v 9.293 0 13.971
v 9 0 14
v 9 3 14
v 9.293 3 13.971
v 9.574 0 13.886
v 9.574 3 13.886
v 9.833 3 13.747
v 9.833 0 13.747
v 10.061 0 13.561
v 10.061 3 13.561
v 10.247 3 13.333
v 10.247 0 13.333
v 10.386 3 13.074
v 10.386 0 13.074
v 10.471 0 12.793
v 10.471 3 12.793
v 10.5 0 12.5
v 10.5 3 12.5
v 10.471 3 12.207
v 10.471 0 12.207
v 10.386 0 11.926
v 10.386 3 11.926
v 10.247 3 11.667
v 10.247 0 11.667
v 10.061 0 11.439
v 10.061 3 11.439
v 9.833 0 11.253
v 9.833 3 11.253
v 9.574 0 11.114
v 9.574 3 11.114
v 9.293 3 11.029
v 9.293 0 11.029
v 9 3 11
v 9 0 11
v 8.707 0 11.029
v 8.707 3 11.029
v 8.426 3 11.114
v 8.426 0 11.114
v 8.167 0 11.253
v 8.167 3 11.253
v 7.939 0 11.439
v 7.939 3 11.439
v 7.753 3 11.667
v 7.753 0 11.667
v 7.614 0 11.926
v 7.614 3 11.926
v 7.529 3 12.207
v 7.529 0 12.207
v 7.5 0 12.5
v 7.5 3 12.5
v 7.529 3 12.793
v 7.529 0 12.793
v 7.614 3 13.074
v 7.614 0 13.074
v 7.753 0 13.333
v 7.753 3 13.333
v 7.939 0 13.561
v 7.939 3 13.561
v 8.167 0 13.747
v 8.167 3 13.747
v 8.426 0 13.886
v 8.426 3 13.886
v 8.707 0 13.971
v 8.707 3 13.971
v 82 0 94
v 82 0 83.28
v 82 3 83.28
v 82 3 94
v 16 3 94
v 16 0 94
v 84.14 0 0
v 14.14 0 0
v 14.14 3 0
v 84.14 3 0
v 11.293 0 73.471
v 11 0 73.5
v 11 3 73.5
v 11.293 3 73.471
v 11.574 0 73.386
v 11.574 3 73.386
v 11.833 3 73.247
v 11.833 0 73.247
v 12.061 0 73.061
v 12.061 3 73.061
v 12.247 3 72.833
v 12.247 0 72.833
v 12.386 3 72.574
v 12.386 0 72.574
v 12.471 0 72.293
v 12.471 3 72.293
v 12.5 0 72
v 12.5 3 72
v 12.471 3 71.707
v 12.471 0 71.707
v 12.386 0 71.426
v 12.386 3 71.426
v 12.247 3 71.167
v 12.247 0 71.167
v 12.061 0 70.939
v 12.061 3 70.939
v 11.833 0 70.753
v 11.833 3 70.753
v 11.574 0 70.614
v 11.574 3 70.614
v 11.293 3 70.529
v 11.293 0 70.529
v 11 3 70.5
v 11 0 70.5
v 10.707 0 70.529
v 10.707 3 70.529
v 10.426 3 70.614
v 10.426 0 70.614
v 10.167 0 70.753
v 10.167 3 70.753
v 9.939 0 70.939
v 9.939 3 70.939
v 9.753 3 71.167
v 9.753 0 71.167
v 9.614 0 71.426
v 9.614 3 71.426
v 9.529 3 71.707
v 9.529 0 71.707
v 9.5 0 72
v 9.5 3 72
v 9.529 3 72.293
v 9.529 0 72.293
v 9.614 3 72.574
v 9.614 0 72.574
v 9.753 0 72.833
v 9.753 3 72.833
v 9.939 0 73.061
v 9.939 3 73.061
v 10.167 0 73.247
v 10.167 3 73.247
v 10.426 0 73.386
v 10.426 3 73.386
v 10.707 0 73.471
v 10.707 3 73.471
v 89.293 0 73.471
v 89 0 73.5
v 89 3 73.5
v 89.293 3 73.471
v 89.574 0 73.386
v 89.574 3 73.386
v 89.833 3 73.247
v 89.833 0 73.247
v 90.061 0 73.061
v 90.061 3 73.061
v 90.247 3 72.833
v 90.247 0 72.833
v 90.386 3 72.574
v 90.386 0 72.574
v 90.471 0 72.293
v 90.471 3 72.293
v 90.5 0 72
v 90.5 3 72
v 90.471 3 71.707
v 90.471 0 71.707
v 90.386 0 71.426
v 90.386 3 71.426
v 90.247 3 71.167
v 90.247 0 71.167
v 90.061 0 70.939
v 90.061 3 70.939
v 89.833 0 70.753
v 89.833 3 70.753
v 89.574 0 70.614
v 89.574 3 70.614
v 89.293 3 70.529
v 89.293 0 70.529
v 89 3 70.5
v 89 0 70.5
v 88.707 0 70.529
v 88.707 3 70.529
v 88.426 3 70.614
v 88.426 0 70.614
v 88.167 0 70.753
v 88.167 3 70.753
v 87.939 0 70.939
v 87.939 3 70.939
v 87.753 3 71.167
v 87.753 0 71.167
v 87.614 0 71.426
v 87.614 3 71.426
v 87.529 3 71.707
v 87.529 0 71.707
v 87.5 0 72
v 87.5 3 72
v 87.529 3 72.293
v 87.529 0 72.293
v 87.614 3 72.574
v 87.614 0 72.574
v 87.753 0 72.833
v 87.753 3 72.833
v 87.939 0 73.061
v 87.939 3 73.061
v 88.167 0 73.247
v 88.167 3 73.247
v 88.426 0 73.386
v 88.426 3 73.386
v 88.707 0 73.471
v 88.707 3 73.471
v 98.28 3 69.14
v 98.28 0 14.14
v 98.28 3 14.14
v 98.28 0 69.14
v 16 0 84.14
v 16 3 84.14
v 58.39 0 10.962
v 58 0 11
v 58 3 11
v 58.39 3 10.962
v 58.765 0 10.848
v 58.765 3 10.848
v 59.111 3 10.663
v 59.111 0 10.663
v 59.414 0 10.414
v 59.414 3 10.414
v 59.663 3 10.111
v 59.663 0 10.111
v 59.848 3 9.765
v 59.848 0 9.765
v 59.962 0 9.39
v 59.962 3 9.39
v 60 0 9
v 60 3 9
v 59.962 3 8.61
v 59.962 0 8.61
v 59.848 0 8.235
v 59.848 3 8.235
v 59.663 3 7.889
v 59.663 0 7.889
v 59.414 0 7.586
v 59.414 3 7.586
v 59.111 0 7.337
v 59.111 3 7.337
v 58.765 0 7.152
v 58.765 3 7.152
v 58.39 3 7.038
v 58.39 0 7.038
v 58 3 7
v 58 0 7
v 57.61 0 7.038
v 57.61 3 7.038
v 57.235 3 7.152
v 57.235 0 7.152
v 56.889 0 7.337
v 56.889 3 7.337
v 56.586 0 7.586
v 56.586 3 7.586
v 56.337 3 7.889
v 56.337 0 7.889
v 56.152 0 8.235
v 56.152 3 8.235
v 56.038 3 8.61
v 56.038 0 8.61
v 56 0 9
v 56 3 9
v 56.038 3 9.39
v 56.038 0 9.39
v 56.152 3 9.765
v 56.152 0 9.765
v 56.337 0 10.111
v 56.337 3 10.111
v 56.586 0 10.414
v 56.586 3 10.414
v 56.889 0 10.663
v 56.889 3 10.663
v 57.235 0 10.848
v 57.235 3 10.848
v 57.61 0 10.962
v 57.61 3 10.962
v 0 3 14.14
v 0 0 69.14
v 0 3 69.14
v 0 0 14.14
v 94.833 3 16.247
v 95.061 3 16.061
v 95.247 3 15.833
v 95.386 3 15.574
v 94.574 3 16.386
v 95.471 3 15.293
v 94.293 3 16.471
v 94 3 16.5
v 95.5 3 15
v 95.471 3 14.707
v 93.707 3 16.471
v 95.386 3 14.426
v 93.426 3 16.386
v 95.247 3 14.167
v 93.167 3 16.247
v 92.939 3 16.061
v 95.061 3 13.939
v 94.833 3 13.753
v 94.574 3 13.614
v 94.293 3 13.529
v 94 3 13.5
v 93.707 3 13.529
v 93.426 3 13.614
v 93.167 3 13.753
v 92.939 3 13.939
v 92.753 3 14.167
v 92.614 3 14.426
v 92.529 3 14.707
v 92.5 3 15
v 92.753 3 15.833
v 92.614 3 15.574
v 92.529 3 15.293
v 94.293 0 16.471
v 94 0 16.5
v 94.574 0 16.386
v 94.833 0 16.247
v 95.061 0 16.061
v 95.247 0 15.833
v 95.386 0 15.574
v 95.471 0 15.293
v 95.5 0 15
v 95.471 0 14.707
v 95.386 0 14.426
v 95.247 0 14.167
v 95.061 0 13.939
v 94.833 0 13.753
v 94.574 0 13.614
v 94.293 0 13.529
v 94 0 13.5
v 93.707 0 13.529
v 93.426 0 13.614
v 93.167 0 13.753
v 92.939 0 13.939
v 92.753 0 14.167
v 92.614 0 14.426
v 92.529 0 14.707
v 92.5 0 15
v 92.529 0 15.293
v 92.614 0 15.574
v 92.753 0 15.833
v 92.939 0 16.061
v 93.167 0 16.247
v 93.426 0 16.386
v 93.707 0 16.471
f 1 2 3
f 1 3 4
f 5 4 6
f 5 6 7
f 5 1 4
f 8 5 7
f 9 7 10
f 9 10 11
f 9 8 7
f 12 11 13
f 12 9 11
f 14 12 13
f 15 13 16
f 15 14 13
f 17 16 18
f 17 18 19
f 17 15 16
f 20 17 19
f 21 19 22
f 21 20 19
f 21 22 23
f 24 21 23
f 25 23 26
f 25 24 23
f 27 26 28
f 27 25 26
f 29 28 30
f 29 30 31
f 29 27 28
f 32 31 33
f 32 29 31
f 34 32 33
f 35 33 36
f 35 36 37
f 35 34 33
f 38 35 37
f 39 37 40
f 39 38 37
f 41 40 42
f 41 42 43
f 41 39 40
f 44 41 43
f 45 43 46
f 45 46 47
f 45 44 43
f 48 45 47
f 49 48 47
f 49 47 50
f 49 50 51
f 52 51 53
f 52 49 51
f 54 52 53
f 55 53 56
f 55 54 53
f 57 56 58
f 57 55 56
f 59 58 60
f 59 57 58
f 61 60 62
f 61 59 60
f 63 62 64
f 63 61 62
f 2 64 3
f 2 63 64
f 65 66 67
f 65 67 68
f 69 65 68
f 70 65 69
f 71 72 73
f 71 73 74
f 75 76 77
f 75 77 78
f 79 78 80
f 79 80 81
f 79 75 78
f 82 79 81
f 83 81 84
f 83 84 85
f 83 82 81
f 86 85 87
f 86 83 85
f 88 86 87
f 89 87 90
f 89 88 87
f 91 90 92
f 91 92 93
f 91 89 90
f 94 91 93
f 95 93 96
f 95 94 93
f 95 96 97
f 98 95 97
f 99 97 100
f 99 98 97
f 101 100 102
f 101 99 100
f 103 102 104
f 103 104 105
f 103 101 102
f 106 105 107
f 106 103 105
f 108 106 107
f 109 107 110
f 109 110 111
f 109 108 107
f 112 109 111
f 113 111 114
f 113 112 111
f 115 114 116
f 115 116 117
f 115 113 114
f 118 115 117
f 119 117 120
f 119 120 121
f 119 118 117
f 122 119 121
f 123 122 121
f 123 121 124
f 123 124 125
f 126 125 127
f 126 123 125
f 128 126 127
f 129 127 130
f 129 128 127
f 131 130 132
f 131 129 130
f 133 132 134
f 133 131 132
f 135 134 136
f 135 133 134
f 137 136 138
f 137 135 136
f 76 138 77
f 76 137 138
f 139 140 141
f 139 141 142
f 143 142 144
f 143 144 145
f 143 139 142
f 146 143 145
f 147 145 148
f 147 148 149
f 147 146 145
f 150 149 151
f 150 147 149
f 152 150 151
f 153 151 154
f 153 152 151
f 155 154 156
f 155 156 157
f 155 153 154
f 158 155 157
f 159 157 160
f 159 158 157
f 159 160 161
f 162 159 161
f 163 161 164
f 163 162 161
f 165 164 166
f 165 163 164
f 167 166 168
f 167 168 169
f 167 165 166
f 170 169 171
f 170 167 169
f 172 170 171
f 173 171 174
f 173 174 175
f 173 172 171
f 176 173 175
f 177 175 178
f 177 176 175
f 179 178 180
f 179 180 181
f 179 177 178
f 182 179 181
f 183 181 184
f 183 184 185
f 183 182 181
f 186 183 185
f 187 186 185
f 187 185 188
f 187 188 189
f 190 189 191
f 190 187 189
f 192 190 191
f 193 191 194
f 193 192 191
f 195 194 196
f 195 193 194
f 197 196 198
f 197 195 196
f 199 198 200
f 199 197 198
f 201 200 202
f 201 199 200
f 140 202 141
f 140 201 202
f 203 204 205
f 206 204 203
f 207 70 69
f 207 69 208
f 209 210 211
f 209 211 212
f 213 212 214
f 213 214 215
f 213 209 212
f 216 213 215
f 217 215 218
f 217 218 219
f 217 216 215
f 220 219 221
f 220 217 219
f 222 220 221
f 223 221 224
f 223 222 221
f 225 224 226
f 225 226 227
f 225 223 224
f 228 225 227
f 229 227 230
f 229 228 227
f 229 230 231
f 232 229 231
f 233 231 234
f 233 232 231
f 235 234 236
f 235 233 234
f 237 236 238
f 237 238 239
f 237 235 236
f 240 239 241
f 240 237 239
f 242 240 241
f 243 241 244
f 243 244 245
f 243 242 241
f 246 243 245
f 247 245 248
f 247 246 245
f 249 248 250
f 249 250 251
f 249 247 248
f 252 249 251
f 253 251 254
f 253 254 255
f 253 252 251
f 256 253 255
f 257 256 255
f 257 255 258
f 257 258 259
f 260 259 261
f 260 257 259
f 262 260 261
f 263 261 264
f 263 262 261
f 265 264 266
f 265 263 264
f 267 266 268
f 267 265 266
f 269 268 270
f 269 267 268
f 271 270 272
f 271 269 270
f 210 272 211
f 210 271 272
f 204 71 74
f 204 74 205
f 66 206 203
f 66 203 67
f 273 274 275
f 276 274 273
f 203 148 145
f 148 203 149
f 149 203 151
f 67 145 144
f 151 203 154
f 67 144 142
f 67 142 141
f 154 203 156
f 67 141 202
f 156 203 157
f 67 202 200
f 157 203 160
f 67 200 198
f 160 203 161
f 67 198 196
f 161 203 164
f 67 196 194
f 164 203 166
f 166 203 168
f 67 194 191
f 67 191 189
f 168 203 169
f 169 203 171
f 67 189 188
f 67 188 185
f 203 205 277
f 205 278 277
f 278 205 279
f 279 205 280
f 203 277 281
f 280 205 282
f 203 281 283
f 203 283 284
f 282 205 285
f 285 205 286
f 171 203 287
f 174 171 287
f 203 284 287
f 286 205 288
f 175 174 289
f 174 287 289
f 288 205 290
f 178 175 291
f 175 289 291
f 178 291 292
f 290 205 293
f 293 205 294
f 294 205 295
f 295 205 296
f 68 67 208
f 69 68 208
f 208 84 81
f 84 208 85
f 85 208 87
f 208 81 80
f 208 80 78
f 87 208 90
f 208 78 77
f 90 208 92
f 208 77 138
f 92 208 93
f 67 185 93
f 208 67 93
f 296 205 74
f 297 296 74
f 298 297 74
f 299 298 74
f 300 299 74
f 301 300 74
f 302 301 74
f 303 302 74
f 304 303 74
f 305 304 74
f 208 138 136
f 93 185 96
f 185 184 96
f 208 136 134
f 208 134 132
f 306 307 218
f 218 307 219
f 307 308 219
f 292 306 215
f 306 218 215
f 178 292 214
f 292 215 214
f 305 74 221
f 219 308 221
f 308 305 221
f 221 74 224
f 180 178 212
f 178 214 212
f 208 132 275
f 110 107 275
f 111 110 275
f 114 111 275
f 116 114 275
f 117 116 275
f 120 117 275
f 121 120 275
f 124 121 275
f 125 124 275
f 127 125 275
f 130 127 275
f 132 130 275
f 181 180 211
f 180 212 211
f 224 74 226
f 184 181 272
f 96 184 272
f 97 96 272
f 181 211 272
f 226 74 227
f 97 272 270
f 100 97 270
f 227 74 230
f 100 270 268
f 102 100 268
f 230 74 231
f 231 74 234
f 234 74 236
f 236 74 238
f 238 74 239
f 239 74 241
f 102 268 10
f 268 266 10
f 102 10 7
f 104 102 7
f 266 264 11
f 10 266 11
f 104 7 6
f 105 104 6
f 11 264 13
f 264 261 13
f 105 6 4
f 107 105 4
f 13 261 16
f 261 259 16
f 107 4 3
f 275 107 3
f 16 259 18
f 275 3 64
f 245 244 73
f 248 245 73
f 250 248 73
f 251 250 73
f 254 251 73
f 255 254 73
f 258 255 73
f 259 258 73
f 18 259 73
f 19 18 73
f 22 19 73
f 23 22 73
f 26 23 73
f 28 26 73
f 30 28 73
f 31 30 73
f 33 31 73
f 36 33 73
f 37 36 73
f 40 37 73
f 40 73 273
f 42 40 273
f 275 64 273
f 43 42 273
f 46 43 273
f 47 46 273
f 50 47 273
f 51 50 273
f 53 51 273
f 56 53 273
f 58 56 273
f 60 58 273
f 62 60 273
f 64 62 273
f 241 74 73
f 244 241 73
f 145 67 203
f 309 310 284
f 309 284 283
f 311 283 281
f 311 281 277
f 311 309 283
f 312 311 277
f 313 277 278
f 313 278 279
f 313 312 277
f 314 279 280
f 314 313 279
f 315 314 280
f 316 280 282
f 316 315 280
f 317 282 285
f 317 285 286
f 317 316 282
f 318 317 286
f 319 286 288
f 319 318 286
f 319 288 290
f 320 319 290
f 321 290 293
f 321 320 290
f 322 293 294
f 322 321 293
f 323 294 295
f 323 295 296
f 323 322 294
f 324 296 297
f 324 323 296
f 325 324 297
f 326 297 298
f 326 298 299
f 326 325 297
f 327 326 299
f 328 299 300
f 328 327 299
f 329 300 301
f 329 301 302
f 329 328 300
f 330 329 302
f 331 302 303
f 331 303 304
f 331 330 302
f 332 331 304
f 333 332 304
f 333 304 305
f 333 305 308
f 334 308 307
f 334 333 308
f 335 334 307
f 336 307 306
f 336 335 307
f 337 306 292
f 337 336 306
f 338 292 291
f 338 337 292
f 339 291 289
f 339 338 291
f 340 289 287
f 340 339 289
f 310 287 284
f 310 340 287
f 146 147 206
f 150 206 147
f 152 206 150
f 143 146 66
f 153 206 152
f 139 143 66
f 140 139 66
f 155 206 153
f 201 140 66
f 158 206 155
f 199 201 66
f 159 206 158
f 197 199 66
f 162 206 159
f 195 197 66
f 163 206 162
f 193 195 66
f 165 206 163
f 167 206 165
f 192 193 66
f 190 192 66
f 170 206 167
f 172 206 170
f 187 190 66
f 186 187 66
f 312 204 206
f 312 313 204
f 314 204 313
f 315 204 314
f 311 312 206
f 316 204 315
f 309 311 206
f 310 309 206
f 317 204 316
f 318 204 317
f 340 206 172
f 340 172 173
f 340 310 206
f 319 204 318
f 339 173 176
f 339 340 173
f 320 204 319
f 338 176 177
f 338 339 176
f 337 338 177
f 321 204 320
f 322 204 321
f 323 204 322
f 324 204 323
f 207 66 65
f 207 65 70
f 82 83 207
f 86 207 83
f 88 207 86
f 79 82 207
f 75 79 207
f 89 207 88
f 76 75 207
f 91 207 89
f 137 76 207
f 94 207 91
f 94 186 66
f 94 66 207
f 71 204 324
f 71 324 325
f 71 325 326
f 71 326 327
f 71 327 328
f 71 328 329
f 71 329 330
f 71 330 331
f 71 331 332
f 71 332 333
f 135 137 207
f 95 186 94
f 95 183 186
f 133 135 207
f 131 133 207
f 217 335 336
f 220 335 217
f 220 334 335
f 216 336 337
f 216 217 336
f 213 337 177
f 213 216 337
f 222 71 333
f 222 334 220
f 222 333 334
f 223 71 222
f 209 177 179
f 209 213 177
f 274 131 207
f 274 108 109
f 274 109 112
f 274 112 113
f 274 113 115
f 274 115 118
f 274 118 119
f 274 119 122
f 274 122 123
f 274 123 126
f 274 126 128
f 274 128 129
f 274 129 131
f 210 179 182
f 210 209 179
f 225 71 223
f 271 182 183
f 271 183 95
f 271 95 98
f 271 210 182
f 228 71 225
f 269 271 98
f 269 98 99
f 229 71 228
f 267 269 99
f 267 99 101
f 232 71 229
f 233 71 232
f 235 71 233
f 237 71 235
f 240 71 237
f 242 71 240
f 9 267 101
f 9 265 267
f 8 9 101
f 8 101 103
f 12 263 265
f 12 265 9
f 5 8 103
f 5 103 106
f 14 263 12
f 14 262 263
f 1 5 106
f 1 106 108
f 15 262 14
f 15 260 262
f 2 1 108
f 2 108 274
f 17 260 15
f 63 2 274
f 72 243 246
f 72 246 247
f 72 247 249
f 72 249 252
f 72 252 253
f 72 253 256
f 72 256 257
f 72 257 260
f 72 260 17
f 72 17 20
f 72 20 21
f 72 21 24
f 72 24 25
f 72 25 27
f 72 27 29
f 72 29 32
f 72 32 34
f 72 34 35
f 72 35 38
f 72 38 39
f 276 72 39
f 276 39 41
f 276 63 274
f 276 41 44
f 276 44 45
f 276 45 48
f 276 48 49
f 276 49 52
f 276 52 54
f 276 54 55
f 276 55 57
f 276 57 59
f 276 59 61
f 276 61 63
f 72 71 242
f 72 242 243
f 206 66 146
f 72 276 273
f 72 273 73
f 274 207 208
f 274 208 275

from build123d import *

# Parameters (mm, degrees)
SKETCH_1_R      = 1.5
SKETCH_1_R_2    = 2
EXTRUDE_1_DEPTH = 3


with BuildPart() as part:
    # 草图1 → 凸台-拉伸1 (new body)
    with BuildSketch(Plane(origin=(0, 0, 0), x_dir=(1, 0, 0), z_dir=(0, 1, 0))):
        Polygon((14.14, 0), (84.14, 0), (98.28, -14.14), (98.28, -69.14), (82, -83.28), (82, -94), (16, -94), (16, -84.14), (0, -69.14), (0, -14.14), align=None)
        with Locations(Location((9, -12.5, 0), (0, 0, 270))):
            Circle(SKETCH_1_R, mode=Mode.SUBTRACT)
        with Locations(Location((94, -15, 0), (0, 0, 270))):
            Circle(SKETCH_1_R, mode=Mode.SUBTRACT)
        with Locations(Location((11, -72, 0), (0, 0, 270))):
            Circle(SKETCH_1_R, mode=Mode.SUBTRACT)
        with Locations(Location((89, -72, 0), (0, 0, 270))):
            Circle(SKETCH_1_R, mode=Mode.SUBTRACT)
        with Locations(Location((58, -9, 0), (0, 0, 270))):
            Circle(SKETCH_1_R_2, mode=Mode.SUBTRACT)
    extrude(amount=EXTRUDE_1_DEPTH)


solid = part.part
